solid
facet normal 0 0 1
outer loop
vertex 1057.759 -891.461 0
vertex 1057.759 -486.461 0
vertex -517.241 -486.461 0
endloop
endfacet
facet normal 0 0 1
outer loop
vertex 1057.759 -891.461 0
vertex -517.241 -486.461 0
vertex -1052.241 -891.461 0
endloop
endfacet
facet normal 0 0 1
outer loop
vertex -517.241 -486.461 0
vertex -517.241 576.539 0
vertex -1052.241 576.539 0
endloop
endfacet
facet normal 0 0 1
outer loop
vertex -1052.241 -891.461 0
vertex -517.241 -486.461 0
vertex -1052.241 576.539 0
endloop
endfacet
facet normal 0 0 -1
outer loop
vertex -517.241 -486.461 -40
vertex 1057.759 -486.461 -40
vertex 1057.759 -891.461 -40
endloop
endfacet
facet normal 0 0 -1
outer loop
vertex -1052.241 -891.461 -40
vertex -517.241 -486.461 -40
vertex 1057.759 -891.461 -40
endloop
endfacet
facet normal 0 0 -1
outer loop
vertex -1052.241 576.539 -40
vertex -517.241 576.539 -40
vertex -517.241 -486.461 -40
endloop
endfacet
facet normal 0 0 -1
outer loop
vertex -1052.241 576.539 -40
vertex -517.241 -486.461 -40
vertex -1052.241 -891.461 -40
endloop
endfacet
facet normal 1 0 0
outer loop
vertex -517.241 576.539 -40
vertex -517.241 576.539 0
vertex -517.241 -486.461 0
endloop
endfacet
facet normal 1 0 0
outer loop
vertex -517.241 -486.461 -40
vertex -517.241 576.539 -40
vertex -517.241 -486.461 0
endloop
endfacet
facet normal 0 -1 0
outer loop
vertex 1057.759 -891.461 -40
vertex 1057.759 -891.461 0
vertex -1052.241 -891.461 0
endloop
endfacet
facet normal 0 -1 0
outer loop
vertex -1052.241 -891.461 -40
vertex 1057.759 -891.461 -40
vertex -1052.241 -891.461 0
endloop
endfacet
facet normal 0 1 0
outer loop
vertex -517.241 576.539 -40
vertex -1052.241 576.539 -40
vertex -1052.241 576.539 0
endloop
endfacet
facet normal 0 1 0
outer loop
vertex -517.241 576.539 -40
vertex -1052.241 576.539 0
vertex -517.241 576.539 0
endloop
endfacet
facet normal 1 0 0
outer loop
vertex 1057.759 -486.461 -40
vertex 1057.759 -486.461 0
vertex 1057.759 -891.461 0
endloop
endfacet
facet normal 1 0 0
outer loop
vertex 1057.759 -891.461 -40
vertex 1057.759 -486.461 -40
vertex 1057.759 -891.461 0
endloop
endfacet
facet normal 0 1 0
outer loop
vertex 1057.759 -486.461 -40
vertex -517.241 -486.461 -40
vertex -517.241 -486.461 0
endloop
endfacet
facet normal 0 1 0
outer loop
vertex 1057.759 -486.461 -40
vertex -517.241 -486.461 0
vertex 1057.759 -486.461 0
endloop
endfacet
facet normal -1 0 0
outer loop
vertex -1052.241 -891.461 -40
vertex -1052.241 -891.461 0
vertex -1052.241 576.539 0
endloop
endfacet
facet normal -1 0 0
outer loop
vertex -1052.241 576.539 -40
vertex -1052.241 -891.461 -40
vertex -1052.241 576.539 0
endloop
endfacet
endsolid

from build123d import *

# Parameters (mm, degrees)
TABAN_FLAN_1_DEPTH         = 40
KES_EKSTR_ZYON1_DEPTH      = 1384.891767514
KES_EKSTR_ZYON1_DEPTH_BACK = 1384.891767514
IZIM2_W                    = 535
IZIM2_H                    = 265
KES_EKSTR_ZYON2_DEPTH      = 1384.891767514
KES_EKSTR_ZYON2_DEPTH_BACK = 1384.891767514
IZIM3_W                    = 1575
IZIM3_H                    = 360
KES_EKSTR_ZYON3_DEPTH      = 1384.891767514
KES_EKSTR_ZYON3_DEPTH_BACK = 1384.891767514
IZIM5_W                    = 535
IZIM5_H                    = 2


# Sheet-metal steps are written as plain solids
with BuildPart() as part:
    # Çizim1 → Taban-Flanş1 (new body)
    with BuildSketch(Plane.XY):
        Polygon((-517.241071282, 843.539135514), (-517.241071282, -126.460864486), (1057.758928718, -126.460864486), (1057.758928718, -891.460864486), (-1052.241071282, -891.460864486), (-1052.241071282, 843.539135514), align=None)
    extrude(amount=-TABAN_FLAN_1_DEPTH)

    # Çizim2 → Kes-Ekstrüzyon1 (cut, two sides: drawn at the far end of the back side and taken through both)
    with BuildSketch(Plane.XY.offset(-KES_EKSTR_ZYON1_DEPTH_BACK)):
        with Locations((-784.741071282, 711.039135514)):
            Rectangle(IZIM2_W, IZIM2_H)
    extrude(amount=KES_EKSTR_ZYON1_DEPTH + KES_EKSTR_ZYON1_DEPTH_BACK, mode=Mode.SUBTRACT)

    # Çizim3 → Kes-Ekstrüzyon2 (cut, two sides: drawn at the far end of the back side and taken through both)
    with BuildSketch(Plane.XY.offset(-KES_EKSTR_ZYON2_DEPTH_BACK)):
        with Locations((270.258928718, -306.460864486)):
            Rectangle(IZIM3_W, IZIM3_H)
    extrude(amount=KES_EKSTR_ZYON2_DEPTH + KES_EKSTR_ZYON2_DEPTH_BACK, mode=Mode.SUBTRACT)

    # Çizim5 → Kes-Ekstrüzyon3 (cut, two sides: drawn at the far end of the back side and taken through both)
    with BuildSketch(Plane.XY.offset(-KES_EKSTR_ZYON3_DEPTH_BACK)):
        with Locations((-784.741071282, 577.539135514)):
            Rectangle(IZIM5_W, IZIM5_H)
    extrude(amount=KES_EKSTR_ZYON3_DEPTH + KES_EKSTR_ZYON3_DEPTH_BACK, mode=Mode.SUBTRACT)


solid = part.part
